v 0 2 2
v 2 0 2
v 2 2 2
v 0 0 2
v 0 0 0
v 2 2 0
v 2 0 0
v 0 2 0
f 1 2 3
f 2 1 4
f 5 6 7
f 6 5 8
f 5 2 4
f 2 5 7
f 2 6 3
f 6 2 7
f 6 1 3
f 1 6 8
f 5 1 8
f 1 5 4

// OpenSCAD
/* [Hidden] */
lib__WALL = 2;
module lib__box() cube(lib__WALL);
lib__box();
